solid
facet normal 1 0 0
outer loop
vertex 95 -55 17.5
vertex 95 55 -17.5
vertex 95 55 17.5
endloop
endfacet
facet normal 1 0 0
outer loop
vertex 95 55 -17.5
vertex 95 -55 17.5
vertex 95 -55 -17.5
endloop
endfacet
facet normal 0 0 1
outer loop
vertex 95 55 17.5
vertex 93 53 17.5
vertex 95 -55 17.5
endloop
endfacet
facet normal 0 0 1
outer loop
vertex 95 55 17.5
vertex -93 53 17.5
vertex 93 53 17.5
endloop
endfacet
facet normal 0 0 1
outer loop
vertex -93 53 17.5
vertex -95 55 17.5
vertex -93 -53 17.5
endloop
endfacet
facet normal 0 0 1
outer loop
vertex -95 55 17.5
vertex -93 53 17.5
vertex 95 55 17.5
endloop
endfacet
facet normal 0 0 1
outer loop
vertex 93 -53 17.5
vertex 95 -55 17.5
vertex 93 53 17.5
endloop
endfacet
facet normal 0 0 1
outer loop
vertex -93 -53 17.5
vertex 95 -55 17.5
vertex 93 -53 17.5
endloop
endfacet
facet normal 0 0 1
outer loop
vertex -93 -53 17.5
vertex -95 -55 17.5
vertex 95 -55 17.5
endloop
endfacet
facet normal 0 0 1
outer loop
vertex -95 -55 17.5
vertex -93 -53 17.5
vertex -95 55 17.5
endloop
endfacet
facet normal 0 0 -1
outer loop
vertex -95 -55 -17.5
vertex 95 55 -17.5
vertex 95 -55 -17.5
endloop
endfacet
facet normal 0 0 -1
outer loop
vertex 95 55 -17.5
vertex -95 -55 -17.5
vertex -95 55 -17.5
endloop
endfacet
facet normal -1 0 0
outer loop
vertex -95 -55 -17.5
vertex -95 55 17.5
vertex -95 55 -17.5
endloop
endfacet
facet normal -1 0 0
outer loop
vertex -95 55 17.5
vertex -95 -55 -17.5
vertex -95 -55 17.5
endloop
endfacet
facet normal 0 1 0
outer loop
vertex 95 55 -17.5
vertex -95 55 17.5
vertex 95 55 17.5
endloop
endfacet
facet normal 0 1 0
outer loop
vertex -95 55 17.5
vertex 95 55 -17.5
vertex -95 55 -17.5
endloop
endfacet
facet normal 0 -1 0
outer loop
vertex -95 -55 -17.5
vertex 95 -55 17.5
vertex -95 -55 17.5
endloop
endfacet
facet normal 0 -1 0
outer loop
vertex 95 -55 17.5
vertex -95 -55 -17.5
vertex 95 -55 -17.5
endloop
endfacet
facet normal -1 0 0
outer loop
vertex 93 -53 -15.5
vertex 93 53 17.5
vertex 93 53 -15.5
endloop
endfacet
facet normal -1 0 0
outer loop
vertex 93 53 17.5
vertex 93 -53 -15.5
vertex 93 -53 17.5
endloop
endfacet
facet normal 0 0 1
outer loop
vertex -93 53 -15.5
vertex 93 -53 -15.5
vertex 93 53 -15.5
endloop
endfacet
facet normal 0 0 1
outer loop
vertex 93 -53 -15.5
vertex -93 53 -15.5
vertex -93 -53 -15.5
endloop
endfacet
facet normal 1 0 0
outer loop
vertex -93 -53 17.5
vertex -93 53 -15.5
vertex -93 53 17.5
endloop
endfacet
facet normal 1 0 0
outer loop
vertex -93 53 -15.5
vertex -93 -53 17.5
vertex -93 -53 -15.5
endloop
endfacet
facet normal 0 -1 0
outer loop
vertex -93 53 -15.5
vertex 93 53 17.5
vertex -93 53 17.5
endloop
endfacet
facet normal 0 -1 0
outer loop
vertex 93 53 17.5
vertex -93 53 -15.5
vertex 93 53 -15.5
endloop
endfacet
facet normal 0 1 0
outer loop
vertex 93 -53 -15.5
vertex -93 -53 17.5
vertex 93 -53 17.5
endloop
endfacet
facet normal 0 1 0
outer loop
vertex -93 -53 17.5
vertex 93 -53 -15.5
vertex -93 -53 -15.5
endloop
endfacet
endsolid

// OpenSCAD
// ========================================
// a 190 x 110 x 35 mm enclosure with 2 mm wall thickness
// NeuroCAD canonical IR; dimensions are millimetres
// ========================================
$fn = 48;

difference() {
  cube(size=[190, 110, 35], center=true);
  translate([0, 0, 1.1]) {
    cube(size=[186, 106, 33.2], center=true);
  }
}
